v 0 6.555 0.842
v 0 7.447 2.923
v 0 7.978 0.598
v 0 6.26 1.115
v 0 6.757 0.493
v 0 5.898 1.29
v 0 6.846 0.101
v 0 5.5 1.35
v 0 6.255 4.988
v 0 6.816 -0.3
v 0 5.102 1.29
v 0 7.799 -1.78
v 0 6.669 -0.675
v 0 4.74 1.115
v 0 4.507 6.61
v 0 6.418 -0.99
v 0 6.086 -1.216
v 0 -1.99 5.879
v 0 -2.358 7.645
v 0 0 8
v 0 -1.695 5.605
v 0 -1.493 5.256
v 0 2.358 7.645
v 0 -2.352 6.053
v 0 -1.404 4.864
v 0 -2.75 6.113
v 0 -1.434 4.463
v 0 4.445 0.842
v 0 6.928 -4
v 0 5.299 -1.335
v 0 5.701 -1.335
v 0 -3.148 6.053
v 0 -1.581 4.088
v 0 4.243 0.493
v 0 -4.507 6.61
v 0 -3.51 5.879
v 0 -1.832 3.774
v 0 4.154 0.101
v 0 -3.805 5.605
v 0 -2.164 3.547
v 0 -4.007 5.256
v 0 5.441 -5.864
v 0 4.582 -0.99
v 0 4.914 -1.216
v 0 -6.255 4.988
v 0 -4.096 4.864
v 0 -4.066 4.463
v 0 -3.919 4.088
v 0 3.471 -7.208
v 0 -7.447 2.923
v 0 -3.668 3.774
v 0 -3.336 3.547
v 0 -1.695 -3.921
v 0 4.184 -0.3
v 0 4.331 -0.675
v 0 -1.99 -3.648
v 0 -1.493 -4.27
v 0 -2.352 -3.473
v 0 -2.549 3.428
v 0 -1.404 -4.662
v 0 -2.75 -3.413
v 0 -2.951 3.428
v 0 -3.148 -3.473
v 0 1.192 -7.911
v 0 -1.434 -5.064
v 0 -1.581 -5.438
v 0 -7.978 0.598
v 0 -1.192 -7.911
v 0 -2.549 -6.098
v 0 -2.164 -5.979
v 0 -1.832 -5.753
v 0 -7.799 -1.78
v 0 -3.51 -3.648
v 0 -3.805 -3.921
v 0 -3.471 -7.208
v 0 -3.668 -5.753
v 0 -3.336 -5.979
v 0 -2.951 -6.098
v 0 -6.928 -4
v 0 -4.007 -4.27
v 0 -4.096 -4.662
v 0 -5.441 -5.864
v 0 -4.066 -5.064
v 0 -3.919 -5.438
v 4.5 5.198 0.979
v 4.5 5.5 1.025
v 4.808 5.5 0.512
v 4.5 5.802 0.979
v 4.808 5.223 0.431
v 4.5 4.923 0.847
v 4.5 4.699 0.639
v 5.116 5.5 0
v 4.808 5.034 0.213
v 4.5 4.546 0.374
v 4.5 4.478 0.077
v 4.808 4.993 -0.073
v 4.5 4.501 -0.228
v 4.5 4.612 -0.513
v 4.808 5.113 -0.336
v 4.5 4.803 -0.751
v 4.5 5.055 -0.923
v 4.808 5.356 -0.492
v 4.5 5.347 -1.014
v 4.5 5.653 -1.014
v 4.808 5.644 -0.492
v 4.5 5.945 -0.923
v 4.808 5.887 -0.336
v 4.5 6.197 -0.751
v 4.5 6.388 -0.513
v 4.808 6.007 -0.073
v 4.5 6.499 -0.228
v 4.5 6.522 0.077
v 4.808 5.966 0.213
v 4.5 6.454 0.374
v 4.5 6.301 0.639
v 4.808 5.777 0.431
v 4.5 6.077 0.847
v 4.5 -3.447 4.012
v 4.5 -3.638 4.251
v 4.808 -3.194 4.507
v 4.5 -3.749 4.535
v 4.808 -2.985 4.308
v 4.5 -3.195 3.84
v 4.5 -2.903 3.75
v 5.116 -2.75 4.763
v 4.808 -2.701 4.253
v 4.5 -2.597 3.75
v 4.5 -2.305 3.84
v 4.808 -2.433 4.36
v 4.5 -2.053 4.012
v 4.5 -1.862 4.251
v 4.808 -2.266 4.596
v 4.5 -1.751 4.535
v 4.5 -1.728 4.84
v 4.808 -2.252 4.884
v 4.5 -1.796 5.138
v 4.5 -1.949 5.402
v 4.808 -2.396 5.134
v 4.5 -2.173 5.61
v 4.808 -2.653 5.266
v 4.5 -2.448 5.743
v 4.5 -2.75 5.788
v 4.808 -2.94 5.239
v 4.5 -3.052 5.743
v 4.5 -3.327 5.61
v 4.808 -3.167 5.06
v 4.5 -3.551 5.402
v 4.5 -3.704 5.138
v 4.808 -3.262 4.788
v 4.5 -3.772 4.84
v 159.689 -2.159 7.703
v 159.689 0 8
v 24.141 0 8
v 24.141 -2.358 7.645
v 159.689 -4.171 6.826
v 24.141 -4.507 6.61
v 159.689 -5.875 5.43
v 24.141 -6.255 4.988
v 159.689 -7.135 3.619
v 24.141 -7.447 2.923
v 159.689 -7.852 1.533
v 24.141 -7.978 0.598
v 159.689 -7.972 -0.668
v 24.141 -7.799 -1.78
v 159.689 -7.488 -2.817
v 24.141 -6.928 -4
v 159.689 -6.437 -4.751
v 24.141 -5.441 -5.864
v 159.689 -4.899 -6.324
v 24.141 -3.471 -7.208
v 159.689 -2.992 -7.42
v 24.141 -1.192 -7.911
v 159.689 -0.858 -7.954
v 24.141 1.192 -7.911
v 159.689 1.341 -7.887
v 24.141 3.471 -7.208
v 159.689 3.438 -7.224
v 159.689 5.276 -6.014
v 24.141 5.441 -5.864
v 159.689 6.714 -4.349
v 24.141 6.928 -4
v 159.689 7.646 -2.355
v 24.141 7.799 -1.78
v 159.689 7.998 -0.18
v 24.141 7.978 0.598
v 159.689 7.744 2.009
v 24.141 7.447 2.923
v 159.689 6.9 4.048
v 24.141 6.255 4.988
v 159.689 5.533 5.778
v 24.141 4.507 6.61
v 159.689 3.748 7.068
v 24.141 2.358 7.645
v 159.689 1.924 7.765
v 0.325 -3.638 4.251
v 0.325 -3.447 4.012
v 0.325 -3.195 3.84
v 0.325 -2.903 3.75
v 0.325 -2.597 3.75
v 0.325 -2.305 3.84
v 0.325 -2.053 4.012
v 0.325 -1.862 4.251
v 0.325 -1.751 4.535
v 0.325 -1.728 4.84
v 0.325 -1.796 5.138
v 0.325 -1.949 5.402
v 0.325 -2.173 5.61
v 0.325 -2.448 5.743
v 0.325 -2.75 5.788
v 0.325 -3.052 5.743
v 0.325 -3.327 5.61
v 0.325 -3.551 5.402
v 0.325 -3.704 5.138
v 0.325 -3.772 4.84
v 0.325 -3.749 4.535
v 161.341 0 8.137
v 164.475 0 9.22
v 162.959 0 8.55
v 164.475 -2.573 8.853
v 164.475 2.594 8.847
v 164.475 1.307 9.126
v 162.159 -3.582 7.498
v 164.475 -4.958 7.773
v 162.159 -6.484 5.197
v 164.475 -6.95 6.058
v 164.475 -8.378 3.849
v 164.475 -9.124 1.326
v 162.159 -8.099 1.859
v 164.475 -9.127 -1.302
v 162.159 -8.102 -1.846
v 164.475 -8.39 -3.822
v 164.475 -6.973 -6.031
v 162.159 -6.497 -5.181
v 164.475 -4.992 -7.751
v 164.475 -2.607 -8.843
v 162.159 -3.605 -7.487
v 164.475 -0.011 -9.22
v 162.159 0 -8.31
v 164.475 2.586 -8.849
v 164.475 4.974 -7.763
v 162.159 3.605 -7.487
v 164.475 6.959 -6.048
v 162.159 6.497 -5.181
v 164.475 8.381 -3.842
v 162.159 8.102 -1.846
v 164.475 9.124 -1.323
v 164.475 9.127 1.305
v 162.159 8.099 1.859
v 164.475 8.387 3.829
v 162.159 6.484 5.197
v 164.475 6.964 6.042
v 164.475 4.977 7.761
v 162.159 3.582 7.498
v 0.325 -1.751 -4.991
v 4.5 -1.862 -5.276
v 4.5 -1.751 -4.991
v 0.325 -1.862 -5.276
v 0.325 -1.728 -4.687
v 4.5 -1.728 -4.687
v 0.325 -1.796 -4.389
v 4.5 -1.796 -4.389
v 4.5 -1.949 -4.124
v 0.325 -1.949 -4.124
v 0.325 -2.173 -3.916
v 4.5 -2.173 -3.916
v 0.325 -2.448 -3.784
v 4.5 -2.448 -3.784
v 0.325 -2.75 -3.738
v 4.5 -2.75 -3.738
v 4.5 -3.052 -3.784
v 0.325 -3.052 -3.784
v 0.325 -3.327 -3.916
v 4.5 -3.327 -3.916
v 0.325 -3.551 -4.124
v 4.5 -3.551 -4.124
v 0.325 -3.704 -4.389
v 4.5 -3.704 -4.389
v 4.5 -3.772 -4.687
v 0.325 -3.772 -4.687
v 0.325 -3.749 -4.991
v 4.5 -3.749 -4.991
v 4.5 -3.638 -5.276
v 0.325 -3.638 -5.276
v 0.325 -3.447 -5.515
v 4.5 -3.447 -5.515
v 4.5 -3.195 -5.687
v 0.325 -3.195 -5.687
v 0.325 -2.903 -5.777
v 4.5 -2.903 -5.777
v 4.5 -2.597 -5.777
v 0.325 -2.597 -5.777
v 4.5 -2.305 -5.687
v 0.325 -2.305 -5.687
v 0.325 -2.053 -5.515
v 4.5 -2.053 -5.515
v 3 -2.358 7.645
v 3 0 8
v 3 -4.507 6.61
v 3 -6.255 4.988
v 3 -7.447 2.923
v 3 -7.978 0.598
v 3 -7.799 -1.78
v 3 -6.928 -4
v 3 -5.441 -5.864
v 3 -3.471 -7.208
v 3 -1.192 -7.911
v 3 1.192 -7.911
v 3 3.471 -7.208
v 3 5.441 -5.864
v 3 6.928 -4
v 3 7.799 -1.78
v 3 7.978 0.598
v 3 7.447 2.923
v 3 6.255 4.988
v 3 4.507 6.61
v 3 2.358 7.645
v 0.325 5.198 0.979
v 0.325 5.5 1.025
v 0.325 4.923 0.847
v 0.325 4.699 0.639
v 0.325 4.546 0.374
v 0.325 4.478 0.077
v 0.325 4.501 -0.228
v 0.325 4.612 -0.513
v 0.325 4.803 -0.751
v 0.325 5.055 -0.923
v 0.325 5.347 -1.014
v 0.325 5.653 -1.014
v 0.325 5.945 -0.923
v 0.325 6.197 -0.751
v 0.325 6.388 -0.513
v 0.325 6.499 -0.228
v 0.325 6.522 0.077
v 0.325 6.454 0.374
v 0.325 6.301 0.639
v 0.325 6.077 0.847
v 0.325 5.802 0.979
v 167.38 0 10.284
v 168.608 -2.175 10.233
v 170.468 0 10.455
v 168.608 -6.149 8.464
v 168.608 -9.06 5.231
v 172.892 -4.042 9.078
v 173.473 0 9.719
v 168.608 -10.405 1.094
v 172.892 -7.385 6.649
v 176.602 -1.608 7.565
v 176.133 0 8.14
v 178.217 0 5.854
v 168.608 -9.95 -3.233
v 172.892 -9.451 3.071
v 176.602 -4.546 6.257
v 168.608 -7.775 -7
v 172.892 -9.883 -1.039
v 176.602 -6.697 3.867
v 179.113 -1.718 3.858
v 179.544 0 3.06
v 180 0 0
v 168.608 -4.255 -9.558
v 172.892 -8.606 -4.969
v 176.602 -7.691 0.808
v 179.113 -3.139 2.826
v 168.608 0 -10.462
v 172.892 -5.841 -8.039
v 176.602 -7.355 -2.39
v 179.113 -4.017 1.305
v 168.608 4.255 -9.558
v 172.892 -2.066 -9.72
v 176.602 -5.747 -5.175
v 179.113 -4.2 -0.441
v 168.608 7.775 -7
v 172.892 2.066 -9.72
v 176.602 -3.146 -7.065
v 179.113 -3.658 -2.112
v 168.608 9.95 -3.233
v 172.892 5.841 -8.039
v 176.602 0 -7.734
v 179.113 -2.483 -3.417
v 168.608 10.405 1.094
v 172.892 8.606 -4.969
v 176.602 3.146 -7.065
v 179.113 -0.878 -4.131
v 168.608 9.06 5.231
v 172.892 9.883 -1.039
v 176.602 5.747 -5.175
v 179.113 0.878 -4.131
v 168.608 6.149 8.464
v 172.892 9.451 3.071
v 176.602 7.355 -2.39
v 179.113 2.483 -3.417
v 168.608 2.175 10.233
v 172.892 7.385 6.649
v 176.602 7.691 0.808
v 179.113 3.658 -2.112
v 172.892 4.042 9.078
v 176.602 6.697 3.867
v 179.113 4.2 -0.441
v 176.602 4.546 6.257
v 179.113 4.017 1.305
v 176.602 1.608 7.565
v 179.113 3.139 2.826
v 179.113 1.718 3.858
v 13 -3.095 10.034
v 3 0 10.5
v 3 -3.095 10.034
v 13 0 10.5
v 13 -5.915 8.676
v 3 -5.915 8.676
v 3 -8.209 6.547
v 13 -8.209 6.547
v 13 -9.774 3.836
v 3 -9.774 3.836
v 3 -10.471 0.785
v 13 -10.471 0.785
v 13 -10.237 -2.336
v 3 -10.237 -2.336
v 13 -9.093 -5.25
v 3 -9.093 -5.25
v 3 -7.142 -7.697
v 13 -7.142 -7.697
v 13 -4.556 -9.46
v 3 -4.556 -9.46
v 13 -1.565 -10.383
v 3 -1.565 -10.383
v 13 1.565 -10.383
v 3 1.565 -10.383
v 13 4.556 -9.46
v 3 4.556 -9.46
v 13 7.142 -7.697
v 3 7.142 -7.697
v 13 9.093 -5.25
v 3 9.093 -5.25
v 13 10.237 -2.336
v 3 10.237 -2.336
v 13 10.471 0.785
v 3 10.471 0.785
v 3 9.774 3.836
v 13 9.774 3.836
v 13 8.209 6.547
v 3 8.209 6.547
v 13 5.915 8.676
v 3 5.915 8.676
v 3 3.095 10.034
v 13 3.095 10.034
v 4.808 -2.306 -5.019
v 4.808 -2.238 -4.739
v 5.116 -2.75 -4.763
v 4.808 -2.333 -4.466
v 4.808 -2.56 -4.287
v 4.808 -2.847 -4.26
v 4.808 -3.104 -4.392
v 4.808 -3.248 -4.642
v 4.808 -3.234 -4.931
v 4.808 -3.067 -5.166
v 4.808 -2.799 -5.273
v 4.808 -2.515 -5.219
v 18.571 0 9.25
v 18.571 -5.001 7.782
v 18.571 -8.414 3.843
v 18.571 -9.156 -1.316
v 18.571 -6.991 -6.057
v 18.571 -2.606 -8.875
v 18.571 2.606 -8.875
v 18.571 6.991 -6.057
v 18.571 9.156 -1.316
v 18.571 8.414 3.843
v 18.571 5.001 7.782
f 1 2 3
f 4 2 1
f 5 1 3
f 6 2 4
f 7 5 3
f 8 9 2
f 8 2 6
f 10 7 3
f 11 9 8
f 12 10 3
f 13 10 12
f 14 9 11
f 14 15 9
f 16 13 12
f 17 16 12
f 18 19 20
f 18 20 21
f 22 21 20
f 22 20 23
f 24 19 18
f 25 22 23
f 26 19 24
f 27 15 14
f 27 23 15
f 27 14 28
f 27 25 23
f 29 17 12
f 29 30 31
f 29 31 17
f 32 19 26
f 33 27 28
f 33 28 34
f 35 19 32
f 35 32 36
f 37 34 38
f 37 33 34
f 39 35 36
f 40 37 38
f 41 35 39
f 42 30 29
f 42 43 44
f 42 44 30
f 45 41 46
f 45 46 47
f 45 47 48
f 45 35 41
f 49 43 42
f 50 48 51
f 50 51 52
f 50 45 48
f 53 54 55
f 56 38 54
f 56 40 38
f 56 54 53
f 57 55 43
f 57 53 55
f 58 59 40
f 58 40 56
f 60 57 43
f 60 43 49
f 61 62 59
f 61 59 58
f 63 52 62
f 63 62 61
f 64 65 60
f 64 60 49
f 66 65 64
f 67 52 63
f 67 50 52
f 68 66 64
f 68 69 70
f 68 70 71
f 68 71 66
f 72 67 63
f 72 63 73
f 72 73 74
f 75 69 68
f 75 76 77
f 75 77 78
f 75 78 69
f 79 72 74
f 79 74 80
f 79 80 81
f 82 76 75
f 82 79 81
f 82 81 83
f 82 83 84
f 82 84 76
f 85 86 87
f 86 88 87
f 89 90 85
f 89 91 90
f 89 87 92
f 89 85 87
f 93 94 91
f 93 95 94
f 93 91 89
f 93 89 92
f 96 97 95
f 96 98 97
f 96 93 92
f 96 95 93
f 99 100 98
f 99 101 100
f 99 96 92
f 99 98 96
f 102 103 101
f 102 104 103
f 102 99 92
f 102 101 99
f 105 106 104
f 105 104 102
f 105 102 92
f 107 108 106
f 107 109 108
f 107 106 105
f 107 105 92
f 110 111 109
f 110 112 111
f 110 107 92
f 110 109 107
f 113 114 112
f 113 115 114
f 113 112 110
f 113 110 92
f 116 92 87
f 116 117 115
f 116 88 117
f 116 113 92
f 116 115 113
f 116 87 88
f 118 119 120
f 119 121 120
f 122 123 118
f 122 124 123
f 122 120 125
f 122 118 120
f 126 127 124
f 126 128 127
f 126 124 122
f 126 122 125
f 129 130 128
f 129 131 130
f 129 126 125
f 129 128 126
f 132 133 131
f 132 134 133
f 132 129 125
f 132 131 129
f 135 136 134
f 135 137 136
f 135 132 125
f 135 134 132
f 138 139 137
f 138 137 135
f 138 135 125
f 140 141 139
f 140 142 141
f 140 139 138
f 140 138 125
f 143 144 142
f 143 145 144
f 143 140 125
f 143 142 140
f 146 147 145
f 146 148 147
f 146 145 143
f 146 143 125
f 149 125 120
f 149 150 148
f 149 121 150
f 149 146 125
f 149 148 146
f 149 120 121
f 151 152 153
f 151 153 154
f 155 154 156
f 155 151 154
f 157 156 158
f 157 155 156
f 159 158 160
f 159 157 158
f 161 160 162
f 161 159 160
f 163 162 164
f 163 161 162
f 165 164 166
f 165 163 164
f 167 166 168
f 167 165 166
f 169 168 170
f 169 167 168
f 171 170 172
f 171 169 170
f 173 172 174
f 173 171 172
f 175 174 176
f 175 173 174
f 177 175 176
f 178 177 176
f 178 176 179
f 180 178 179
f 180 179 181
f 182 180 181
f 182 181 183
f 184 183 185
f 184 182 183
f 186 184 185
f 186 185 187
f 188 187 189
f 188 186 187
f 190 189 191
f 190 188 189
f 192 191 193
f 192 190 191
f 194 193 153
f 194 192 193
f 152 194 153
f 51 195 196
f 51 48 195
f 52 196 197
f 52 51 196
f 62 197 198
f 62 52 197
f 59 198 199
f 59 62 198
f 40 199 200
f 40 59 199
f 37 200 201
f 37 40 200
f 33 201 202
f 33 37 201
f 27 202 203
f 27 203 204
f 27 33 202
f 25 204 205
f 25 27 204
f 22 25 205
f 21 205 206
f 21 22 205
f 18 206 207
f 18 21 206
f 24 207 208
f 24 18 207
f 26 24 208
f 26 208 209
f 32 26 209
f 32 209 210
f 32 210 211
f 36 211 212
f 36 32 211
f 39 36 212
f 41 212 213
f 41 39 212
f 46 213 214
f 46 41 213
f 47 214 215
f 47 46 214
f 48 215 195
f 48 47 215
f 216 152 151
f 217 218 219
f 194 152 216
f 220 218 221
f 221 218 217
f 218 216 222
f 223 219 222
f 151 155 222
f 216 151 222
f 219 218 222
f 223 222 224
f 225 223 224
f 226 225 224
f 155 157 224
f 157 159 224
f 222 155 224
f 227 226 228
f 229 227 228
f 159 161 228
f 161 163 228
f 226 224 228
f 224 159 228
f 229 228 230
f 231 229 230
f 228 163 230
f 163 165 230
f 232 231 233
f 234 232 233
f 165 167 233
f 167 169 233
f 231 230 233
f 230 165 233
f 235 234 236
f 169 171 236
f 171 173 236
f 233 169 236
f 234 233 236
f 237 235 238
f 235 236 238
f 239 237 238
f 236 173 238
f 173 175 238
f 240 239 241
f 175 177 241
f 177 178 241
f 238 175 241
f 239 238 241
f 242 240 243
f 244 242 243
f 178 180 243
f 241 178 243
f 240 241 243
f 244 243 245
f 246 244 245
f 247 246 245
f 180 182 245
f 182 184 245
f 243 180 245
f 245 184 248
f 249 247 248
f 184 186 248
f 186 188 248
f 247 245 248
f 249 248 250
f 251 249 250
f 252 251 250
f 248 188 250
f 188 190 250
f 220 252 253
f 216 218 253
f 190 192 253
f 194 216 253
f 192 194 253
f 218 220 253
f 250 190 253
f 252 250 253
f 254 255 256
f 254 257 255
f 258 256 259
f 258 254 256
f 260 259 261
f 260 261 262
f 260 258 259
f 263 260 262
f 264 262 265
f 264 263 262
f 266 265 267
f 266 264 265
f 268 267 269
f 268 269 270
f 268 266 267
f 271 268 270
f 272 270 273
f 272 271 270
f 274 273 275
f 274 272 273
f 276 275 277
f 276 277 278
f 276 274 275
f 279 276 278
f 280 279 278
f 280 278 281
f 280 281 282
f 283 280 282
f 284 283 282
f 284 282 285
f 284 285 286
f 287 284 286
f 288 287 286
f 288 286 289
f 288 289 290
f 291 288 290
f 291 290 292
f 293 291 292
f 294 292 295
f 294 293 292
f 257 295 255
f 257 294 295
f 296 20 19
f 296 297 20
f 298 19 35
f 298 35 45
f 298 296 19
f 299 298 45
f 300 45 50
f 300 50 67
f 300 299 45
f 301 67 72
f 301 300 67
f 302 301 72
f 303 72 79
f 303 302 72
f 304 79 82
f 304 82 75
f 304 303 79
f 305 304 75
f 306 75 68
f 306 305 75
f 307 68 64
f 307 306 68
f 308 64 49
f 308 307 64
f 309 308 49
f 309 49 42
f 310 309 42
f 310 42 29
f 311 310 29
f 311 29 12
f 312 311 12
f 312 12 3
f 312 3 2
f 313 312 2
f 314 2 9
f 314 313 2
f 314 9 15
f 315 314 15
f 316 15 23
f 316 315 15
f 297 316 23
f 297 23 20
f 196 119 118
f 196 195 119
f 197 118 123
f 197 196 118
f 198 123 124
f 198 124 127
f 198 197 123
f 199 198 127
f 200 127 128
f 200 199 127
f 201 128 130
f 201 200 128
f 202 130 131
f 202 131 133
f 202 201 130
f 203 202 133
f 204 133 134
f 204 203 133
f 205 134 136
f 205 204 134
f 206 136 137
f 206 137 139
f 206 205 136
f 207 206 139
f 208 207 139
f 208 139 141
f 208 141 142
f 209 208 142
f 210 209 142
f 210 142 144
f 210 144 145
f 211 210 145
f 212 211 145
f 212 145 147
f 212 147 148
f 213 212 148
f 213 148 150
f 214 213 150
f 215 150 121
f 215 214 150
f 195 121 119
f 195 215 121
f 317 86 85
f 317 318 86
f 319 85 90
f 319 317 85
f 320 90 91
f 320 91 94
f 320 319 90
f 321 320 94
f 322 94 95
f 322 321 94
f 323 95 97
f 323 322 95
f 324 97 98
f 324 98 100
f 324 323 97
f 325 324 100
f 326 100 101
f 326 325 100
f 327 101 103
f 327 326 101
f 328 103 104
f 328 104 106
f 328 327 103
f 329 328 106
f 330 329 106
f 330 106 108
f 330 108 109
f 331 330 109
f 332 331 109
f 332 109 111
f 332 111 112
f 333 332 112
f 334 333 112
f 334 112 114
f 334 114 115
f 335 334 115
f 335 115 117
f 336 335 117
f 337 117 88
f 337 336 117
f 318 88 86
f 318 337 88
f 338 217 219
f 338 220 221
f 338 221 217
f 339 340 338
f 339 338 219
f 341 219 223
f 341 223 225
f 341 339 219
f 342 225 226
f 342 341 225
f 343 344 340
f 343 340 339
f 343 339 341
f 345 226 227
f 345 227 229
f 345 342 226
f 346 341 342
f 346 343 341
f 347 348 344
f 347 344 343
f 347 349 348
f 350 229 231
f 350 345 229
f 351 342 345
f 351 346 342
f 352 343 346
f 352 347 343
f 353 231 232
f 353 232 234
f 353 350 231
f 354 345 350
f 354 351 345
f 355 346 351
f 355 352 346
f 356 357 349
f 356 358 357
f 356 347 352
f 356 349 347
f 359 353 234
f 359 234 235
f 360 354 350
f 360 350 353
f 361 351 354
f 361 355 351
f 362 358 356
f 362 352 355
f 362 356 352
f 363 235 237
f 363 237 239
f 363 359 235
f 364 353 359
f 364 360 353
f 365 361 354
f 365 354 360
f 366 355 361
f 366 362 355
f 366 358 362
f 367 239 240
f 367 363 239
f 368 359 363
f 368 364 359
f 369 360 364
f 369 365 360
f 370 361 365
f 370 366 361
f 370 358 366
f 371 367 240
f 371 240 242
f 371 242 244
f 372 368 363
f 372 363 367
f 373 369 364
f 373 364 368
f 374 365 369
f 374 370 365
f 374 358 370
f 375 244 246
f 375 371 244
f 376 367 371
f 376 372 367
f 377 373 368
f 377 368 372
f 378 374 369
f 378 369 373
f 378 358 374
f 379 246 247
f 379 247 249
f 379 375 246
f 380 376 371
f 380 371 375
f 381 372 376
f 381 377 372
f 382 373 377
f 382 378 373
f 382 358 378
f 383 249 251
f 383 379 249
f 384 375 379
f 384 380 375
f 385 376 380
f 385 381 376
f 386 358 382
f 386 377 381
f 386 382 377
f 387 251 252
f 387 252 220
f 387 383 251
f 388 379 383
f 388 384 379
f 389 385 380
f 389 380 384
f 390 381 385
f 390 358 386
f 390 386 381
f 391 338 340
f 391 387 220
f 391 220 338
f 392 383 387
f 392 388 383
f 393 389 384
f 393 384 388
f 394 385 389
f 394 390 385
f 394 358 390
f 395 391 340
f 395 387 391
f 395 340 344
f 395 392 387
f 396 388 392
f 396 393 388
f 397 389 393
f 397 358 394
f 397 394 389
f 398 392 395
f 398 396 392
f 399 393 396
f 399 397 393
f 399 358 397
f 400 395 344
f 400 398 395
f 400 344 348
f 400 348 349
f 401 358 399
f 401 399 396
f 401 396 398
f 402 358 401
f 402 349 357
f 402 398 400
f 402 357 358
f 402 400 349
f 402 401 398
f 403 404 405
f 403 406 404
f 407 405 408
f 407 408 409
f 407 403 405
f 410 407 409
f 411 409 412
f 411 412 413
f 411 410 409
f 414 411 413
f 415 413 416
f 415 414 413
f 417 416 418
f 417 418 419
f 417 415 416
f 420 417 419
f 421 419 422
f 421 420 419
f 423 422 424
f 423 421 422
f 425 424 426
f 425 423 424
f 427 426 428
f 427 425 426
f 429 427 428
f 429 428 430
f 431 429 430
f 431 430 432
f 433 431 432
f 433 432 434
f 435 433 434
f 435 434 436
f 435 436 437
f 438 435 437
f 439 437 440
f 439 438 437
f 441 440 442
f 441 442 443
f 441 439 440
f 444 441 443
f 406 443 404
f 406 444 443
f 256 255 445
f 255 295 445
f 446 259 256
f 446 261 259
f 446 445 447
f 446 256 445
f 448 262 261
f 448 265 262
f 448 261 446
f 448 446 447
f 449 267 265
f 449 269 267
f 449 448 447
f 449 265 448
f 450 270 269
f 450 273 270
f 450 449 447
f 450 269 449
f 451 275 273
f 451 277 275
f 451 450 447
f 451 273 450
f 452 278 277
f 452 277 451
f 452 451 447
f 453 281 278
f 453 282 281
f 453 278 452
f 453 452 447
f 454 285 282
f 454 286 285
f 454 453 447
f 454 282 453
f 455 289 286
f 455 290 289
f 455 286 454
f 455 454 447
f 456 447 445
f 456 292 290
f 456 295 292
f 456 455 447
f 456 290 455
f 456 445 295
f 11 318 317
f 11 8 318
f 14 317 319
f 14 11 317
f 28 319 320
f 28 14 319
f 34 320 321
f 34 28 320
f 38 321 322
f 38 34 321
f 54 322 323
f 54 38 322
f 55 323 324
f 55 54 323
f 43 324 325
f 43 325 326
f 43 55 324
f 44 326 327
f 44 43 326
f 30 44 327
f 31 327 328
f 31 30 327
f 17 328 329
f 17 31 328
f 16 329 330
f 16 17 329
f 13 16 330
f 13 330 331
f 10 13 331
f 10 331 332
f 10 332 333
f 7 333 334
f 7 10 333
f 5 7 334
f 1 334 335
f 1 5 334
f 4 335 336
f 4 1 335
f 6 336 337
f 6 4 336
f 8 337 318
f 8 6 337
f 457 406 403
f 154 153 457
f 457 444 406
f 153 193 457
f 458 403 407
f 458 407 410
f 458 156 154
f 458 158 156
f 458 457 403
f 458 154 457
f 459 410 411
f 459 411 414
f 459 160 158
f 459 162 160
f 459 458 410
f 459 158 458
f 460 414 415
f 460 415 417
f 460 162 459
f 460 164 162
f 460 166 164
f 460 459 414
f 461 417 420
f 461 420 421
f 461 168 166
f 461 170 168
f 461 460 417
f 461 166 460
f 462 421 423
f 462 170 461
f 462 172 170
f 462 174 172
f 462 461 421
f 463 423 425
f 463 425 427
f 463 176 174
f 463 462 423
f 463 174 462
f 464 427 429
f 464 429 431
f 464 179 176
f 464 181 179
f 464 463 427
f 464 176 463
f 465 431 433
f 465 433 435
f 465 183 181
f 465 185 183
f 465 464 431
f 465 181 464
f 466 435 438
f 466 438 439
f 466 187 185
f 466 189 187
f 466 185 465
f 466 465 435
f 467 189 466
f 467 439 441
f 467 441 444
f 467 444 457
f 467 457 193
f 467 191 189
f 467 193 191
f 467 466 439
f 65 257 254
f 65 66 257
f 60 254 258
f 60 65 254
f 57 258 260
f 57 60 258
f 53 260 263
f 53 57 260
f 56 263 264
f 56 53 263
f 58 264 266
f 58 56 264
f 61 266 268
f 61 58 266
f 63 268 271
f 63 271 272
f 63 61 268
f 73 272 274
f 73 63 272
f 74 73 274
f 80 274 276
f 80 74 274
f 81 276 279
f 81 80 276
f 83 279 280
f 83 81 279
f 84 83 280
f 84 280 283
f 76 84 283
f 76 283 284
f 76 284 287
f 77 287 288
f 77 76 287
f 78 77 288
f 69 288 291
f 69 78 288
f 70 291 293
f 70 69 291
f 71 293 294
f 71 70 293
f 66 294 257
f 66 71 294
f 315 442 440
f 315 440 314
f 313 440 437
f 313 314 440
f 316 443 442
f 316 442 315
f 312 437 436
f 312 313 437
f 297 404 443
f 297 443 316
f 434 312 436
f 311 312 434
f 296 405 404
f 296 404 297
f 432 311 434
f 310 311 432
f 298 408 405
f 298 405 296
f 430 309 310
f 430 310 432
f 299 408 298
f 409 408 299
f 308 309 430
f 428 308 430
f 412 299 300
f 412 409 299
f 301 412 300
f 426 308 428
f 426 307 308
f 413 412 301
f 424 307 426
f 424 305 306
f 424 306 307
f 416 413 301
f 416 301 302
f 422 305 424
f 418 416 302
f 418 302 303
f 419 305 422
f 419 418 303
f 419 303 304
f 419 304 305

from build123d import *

# Parameters (mm, degrees)
R_P_TITION_CIRCULAIRE1_COUNT = 3
CONG_1_R                     = 10


with BuildPart() as part:
    # Esquisse1 → Révolution1 (revolve)
    with BuildSketch(Plane.XY, mode=Mode.PRIVATE) as r_volution1_sk:
        with BuildLine():
            Line((0, 0), (0, 8))
            Line((0, 8), (3, 8))
            Line((3, 8), (3, 10.5))
            Line((3, 10.5), (13, 10.5))
            Line((13, 10.5), (24.141100896, 8))
            Line((24.141100896, 8), (162.699264746, 8))
            ThreePointArc((162.699264746, 8), (173.906942241, 9.530417624), (180, 0))
            Line((180, 0), (0, 0))
        make_face()
    revolve(r_volution1_sk.sketch.rotate(Axis((-57.132155607, 0, 0), (1, 0, 0)), 90), axis=Axis((-57.132155607, 0, 0), (1, 0, 0)))

    # Esquisse4 → Trou taraudé M2.51 (revolve, cut)
    with BuildSketch(Plane.ZX.offset(5.5)):
        Polygon((0, 0), (0, 5.115882135), (1.025, 4.5), (1.025, 0.325), (1.35, 0), align=None)
    trou_taraud_m2_51 = revolve(axis=Axis((-6.35, 5.5, 0), (1, 0, 0)), mode=Mode.SUBTRACT)

    # Répétition circulaire1: Trou taraudé M2.51 ×3 about axis
    r_p_tition_circulaire1_axis = Axis((0, 0, 0), (1, 0, 0))
    for i in range(1, R_P_TITION_CIRCULAIRE1_COUNT):
        add(trou_taraud_m2_51.rotate(r_p_tition_circulaire1_axis, i * 360 / R_P_TITION_CIRCULAIRE1_COUNT), mode=Mode.SUBTRACT)

    # Congé1
    cong_1_edges = [part.edges().sort_by_distance(p)[0] for p in [
        (162.699264746, 0, -8),
    ]]
    fillet(cong_1_edges, radius=CONG_1_R)


solid = part.part
